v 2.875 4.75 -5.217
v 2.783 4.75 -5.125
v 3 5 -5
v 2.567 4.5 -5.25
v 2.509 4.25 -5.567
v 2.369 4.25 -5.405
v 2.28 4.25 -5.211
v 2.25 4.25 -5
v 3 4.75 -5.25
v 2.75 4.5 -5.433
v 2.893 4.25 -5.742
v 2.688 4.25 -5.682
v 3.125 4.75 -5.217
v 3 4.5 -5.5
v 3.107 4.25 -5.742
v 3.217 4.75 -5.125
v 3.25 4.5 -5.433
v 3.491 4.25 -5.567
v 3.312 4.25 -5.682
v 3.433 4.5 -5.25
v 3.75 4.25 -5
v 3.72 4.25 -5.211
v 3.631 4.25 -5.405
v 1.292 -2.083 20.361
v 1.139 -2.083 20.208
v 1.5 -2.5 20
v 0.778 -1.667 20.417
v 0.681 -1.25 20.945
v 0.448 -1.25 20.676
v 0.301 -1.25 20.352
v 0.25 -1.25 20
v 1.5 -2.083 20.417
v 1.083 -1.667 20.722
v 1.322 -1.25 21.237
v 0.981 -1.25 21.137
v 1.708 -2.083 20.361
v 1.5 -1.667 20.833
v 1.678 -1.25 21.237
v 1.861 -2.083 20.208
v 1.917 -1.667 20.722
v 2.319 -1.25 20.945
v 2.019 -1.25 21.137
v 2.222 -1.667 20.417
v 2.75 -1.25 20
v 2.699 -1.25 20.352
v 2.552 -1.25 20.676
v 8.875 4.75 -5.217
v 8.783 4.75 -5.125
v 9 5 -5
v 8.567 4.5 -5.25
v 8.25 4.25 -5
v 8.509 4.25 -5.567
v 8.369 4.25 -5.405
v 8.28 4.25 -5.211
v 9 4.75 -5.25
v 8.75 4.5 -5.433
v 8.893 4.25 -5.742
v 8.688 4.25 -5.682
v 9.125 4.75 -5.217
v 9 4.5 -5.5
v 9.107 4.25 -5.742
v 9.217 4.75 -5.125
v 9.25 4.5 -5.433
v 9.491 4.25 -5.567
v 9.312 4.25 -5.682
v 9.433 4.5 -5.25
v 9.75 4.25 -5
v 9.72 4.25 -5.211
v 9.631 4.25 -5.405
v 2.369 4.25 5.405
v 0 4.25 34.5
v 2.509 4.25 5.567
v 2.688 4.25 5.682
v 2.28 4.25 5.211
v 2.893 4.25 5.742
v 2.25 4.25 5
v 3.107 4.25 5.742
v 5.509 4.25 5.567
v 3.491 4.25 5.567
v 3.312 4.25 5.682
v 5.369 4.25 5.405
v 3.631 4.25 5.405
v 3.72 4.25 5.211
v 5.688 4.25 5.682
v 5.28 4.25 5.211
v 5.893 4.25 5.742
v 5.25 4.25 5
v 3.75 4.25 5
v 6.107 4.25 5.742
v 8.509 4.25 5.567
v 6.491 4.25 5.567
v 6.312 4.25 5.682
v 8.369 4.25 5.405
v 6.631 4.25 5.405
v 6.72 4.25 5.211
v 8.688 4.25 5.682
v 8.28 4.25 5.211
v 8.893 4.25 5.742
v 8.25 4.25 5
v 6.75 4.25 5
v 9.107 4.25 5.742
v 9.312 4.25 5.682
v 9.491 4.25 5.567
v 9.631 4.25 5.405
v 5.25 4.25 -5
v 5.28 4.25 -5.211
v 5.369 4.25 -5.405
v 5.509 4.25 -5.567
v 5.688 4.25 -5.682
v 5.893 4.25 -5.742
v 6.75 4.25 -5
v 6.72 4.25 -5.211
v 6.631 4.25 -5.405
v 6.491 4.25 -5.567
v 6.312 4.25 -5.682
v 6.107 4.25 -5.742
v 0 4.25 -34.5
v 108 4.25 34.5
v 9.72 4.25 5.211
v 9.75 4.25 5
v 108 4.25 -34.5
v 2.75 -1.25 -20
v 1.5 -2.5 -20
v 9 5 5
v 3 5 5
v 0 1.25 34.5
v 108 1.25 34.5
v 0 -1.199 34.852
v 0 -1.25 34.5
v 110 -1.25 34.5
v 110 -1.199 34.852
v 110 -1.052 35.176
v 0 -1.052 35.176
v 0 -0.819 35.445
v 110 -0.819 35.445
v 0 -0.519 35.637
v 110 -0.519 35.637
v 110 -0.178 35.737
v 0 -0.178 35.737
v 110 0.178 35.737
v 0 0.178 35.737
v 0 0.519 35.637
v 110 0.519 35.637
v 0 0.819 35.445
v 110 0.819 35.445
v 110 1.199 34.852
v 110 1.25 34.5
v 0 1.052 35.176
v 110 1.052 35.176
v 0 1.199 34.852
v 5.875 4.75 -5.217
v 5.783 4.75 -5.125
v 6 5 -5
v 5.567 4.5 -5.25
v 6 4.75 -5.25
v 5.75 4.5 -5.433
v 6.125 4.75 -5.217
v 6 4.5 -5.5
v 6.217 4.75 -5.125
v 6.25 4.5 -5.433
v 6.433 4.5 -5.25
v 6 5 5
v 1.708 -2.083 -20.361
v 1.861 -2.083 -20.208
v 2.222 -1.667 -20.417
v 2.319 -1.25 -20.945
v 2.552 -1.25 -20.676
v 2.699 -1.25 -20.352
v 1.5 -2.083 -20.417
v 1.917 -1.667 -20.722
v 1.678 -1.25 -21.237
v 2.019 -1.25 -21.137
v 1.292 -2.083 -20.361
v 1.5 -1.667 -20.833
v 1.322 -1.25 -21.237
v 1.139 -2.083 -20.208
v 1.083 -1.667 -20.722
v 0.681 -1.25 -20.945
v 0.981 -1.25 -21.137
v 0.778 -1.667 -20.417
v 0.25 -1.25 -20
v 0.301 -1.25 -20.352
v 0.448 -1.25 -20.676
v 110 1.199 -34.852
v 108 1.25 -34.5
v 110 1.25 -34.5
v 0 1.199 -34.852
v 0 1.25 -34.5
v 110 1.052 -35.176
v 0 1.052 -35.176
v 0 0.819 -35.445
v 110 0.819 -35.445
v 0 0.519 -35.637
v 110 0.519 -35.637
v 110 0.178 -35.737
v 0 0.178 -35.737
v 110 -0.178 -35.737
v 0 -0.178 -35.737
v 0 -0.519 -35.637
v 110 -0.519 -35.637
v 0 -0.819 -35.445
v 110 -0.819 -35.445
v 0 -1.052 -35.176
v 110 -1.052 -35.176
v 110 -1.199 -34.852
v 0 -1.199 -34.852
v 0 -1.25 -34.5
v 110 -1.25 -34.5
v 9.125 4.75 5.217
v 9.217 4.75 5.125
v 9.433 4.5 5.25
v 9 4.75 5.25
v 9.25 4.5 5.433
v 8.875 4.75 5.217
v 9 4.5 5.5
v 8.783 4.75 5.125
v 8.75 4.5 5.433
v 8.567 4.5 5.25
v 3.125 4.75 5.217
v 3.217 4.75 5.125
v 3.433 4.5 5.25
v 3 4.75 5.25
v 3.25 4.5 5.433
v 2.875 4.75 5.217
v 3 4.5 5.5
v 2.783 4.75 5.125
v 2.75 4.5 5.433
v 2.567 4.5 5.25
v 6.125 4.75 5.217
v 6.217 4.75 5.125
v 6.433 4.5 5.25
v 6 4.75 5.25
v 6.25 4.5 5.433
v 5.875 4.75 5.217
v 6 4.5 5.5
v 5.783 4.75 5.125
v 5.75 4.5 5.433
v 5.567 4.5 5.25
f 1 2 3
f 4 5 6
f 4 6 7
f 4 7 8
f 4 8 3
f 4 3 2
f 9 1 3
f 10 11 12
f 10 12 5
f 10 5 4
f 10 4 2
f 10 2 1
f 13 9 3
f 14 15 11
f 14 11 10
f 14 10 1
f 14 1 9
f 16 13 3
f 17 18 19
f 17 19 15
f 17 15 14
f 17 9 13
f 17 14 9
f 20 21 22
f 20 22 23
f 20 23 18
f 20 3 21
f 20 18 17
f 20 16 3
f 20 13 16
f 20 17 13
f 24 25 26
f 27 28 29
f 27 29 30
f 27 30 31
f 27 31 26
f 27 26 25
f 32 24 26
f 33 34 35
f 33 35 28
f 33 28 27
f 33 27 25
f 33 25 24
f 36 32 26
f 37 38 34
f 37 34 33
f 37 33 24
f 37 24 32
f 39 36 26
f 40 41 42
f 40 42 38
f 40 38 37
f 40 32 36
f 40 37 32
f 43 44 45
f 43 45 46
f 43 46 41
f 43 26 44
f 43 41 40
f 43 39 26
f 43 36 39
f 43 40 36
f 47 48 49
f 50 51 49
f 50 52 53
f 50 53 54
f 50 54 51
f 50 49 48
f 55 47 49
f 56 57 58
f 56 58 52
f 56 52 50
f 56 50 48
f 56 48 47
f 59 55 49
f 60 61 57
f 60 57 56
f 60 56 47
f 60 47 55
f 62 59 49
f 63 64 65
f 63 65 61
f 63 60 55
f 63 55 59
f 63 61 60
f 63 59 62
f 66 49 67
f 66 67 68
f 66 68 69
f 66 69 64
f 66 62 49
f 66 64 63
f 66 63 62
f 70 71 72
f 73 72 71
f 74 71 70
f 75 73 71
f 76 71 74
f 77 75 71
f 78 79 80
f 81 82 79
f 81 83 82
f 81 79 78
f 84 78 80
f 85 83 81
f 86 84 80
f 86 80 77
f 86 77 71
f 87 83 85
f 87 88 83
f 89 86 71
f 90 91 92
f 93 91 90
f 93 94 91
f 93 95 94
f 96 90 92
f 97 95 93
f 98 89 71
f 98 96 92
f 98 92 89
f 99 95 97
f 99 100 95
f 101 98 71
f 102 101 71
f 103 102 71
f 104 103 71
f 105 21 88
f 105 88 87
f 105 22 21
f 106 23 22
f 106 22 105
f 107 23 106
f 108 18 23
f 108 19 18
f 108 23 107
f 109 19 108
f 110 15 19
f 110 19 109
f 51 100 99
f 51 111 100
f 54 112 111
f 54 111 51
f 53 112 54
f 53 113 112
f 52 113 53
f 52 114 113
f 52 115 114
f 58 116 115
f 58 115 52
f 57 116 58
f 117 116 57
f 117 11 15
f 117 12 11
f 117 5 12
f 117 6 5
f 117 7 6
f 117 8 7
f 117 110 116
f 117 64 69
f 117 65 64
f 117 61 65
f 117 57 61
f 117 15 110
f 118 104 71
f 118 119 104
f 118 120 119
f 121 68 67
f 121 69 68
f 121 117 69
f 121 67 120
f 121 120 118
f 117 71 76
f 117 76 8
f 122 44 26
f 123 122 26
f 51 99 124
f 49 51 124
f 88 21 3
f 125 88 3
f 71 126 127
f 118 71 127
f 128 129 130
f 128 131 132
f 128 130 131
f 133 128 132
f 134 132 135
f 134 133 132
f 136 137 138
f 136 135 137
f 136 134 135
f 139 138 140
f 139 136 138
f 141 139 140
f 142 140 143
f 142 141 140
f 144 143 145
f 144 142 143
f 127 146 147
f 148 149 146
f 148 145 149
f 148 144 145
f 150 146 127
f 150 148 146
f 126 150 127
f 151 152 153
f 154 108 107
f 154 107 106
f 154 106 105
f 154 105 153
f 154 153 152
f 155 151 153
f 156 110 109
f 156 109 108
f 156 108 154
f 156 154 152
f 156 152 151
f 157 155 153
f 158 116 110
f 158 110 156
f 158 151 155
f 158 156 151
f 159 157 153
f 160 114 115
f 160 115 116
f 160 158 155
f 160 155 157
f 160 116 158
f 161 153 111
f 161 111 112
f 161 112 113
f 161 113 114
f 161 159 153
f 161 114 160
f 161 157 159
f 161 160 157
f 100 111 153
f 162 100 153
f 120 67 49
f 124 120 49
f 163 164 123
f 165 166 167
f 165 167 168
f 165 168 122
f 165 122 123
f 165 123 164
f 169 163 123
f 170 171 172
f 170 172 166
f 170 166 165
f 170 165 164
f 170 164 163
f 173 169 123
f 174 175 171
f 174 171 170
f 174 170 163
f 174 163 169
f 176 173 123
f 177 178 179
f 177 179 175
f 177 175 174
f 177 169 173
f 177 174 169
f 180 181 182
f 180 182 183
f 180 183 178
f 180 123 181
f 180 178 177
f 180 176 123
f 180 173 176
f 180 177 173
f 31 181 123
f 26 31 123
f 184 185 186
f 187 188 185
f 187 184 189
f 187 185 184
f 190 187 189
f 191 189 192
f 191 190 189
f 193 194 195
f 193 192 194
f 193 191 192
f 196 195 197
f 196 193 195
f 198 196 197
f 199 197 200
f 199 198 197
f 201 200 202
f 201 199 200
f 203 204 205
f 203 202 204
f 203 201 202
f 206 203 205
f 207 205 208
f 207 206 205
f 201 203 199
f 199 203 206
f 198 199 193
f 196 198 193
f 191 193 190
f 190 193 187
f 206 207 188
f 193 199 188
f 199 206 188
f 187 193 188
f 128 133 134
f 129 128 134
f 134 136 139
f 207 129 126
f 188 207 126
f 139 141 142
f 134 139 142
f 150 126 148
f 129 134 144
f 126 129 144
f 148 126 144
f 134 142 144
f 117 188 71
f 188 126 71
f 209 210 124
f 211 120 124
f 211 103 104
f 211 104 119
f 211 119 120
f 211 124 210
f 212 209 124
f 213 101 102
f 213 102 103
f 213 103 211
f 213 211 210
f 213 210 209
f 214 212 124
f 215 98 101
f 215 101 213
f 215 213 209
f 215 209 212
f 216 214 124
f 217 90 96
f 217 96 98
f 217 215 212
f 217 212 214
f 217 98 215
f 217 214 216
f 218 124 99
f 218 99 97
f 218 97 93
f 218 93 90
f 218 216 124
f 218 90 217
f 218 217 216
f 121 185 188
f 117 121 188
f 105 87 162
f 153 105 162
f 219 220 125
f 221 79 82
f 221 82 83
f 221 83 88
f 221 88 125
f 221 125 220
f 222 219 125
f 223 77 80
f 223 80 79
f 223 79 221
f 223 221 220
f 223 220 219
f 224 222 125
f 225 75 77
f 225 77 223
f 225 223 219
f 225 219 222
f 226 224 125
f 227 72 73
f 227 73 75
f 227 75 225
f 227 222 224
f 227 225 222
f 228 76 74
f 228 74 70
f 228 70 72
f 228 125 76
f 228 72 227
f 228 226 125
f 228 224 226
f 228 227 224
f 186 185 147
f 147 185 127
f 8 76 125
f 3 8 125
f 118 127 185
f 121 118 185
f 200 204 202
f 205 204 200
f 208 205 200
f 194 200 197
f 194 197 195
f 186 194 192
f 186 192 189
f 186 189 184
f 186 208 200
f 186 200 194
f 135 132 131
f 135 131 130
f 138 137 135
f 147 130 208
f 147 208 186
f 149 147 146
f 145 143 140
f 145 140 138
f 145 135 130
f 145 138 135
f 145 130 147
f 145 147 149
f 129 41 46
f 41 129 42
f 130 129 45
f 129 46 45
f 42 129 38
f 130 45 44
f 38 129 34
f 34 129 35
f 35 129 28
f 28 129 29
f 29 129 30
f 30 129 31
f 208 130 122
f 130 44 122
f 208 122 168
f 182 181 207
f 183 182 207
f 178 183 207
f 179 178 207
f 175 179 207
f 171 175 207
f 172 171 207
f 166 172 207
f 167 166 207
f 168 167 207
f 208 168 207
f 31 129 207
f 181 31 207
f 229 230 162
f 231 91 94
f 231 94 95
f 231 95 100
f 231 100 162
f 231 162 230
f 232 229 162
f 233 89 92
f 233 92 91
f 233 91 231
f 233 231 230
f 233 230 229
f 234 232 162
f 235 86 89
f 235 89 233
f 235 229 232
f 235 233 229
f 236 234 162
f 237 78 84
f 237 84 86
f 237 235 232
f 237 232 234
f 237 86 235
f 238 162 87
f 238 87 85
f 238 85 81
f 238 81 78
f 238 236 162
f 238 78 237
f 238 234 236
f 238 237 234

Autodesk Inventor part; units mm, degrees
ref_plane "YZ Plane" through (0, 0, 0) normal (1, 0, 0) x (0, 1, 0)
ref_plane "XZ Plane" through (0, 0, 0) normal (0, 1, 0) x (-1, 0, 0)
ref_plane "XY Plane" through (0, 0, 0) normal (0, 0, 1) x (1, 0, 0)
sketch "Sketch1" plane through (0, 0, 0) normal (1, 0, 0) x (0, 1, 0)
  line L0 (0, 34.5) -> (0, -34.5) construction
  line L1 (-1.25, 34.5) -> (-1.25, -34.5)
  line L2 (1.25, -34.5) -> (1.25, 34.5)
  arc A0 (1.25, 34.5) -> (-1.25, 34.5) centre (0, 34.5) ccw
  arc A1 (-1.25, -34.5) -> (1.25, -34.5) centre (0, -34.5) ccw
  line L3 (0, 0) -> (69, 0) construction
  dimension "d0" = 34.5
  dimension "d1" = 90
  dimension "d2" = 2.5
sketch "Sketch1 outline for Extrusion1" plane through (0, 0, 0) normal (1, 0, 0) x (0, 1, 0)
  arc A0 (-1.25, -34.5) -> (1.25, -34.5) centre (0, -34.5) ccw
  line L0 (-1.25, 34.5) -> (-1.25, -34.5)
  arc A1 (1.25, 34.5) -> (-1.25, 34.5) centre (0, 34.5) ccw
  line L1 (1.25, -34.5) -> (1.25, 34.5)
extrude "Extrusion1" add sketch "Sketch1 outline for Extrusion1" along normal blind 110
sketch "Sketch2" plane through (0, 1.25, 34.5) normal (0, 1, 0) x (1, 0, 0)
  line L0 (0, 34.5) -> (108, 34.5)
  line L1 (0, 34.5) -> (108, 34.5) construction
  line L2 (108, 34.5) -> (108, 69)
  line L3 (108, 34.5) -> (108, 0)
  line L4 (110, 69) -> (110, 0) projected
  line L5 (108, 34.5) -> (142.5, 34.5) construction
  line L6 (108, 0) -> (108, 69)
  line L7 (108, 69) -> (0, 69)
  line L8 (0, 69) -> (0, 0)
  line L9 (0, 0) -> (108, 0)
  line L10 (110, 69) -> (110, 70.25) projected
  line L11 (0, 69) -> (0, 0) projected
  dimension "d5" = 108
  dimension "d6" = 0
  dimension "d7" = 34.5
  dimension "d8" = 34.5
  dimension "d9" = 90
sketch "Sketch2 outline for Extrusion2" plane through (0, 1.25, 34.5) normal (0, 1, 0) x (1, 0, 0)
  line L0 (108, 69) -> (0, 69)
  line L1 (108, 34.5) -> (108, 69)
  line L2 (108, 0) -> (108, 34.5)
  line L3 (0, 0) -> (108, 0)
  line L4 (0, 69) -> (0, 0)
extrude "Extrusion2" add sketch "Sketch2 outline for Extrusion2" along normal blind 3
sketch "Sketch3" plane through (0, 4.25, 34.5) normal (0, 1, 0) x (1, 0, 0)
  line L0 (0, 34.5) -> (3, 34.5)
  line L1 (3, 34.5) -> (6, 34.5)
  line L2 (6, 34.5) -> (9, 34.5)
  line L3 (9, 29.5) -> (9, 39.5) construction
  line L4 (9.75, 29.5) -> (9.75, 39.5)
  line L5 (8.25, 39.5) -> (8.25, 29.5)
  arc A0 (8.25, 29.5) -> (9.75, 29.5) centre (9, 29.5) ccw
  arc A1 (9.75, 39.5) -> (8.25, 39.5) centre (9, 39.5) ccw
  line L6 (9, 34.5) -> (19, 34.5) construction
  line L7 (6, 29.5) -> (6, 39.5) construction
  line L8 (6.75, 29.5) -> (6.75, 39.5)
  line L9 (5.25, 39.5) -> (5.25, 29.5)
  arc A2 (5.25, 29.5) -> (6.75, 29.5) centre (6, 29.5) ccw
  arc A3 (6.75, 39.5) -> (5.25, 39.5) centre (6, 39.5) ccw
  line L10 (3, 29.5) -> (3, 39.5) construction
  line L11 (3.75, 29.5) -> (3.75, 39.5)
  line L12 (2.25, 39.5) -> (2.25, 29.5)
  arc A4 (2.25, 29.5) -> (3.75, 29.5) centre (3, 29.5) ccw
  arc A5 (3.75, 39.5) -> (2.25, 39.5) centre (3, 39.5) ccw
  dimension "d12" = 3
  dimension "d13" = 3
  dimension "d14" = 3
  dimension "d15" = 180
  dimension "d16" = 5
  dimension "d17" = 90
  dimension "d18" = 1.5
  dimension "d19" = 5
  dimension "d20" = 1.5
  dimension "d21" = 5
  dimension "d22" = 1.5
sketch "Sketch3 outline for Extrusion3" plane through (0, 4.25, 34.5) normal (0, 1, 0) x (1, 0, 0)
  arc A0 (9.75, 39.5) -> (8.25, 39.5) centre (9, 39.5) ccw
  line L0 (9.75, 29.5) -> (9.75, 39.5)
  arc A1 (8.25, 29.5) -> (9.75, 29.5) centre (9, 29.5) ccw
  line L1 (8.25, 39.5) -> (8.25, 29.5)
  arc A2 (5.25, 29.5) -> (6.75, 29.5) centre (6, 29.5) ccw
  line L2 (5.25, 39.5) -> (5.25, 29.5)
  arc A3 (6.75, 39.5) -> (5.25, 39.5) centre (6, 39.5) ccw
  line L3 (6.75, 29.5) -> (6.75, 39.5)
  arc A4 (2.25, 29.5) -> (3.75, 29.5) centre (3, 29.5) ccw
  line L4 (2.25, 39.5) -> (2.25, 29.5)
  arc A5 (3.75, 39.5) -> (2.25, 39.5) centre (3, 39.5) ccw
  line L5 (3.75, 29.5) -> (3.75, 39.5)
extrude "Extrusion3" add sketch "Sketch3 outline for Extrusion3" along normal blind 2 draft -45
sketch "Sketch4" plane through (0, -1.25, -34.5) normal (0, -1, 0) x (1, 0, 0)
  line L0 (0, 34.5) -> (1.5, 34.5)
  line L1 (1.5, 14.5) -> (1.5, 54.5) construction
  line L2 (6, 39.5) -> (6, 29.5) projected
  line L3 (2.75, 14.5) -> (2.75, 54.5)
  line L4 (0.25, 54.5) -> (0.25, 14.5)
  arc A0 (0.25, 14.5) -> (2.75, 14.5) centre (1.5, 14.5) ccw
  arc A1 (2.75, 54.5) -> (0.25, 54.5) centre (1.5, 54.5) ccw
  line L5 (1.5, 34.5) -> (41.5, 34.5) construction
  dimension "d25" = 1.5
  dimension "d26" = 20
  dimension "d27" = 90
  dimension "d28" = 2.5
sketch "Sketch4 outline for Extrusion4" plane through (0, -1.25, -34.5) normal (0, -1, 0) x (1, 0, 0)
  arc A0 (2.75, 54.5) -> (0.25, 54.5) centre (1.5, 54.5) ccw
  line L0 (2.75, 14.5) -> (2.75, 54.5)
  arc A1 (0.25, 14.5) -> (2.75, 14.5) centre (1.5, 14.5) ccw
  line L1 (0.25, 54.5) -> (0.25, 14.5)
extrude "Extrusion4" add sketch "Sketch4 outline for Extrusion4" along normal blind 2 draft -45
properties part number "Case-Top"
